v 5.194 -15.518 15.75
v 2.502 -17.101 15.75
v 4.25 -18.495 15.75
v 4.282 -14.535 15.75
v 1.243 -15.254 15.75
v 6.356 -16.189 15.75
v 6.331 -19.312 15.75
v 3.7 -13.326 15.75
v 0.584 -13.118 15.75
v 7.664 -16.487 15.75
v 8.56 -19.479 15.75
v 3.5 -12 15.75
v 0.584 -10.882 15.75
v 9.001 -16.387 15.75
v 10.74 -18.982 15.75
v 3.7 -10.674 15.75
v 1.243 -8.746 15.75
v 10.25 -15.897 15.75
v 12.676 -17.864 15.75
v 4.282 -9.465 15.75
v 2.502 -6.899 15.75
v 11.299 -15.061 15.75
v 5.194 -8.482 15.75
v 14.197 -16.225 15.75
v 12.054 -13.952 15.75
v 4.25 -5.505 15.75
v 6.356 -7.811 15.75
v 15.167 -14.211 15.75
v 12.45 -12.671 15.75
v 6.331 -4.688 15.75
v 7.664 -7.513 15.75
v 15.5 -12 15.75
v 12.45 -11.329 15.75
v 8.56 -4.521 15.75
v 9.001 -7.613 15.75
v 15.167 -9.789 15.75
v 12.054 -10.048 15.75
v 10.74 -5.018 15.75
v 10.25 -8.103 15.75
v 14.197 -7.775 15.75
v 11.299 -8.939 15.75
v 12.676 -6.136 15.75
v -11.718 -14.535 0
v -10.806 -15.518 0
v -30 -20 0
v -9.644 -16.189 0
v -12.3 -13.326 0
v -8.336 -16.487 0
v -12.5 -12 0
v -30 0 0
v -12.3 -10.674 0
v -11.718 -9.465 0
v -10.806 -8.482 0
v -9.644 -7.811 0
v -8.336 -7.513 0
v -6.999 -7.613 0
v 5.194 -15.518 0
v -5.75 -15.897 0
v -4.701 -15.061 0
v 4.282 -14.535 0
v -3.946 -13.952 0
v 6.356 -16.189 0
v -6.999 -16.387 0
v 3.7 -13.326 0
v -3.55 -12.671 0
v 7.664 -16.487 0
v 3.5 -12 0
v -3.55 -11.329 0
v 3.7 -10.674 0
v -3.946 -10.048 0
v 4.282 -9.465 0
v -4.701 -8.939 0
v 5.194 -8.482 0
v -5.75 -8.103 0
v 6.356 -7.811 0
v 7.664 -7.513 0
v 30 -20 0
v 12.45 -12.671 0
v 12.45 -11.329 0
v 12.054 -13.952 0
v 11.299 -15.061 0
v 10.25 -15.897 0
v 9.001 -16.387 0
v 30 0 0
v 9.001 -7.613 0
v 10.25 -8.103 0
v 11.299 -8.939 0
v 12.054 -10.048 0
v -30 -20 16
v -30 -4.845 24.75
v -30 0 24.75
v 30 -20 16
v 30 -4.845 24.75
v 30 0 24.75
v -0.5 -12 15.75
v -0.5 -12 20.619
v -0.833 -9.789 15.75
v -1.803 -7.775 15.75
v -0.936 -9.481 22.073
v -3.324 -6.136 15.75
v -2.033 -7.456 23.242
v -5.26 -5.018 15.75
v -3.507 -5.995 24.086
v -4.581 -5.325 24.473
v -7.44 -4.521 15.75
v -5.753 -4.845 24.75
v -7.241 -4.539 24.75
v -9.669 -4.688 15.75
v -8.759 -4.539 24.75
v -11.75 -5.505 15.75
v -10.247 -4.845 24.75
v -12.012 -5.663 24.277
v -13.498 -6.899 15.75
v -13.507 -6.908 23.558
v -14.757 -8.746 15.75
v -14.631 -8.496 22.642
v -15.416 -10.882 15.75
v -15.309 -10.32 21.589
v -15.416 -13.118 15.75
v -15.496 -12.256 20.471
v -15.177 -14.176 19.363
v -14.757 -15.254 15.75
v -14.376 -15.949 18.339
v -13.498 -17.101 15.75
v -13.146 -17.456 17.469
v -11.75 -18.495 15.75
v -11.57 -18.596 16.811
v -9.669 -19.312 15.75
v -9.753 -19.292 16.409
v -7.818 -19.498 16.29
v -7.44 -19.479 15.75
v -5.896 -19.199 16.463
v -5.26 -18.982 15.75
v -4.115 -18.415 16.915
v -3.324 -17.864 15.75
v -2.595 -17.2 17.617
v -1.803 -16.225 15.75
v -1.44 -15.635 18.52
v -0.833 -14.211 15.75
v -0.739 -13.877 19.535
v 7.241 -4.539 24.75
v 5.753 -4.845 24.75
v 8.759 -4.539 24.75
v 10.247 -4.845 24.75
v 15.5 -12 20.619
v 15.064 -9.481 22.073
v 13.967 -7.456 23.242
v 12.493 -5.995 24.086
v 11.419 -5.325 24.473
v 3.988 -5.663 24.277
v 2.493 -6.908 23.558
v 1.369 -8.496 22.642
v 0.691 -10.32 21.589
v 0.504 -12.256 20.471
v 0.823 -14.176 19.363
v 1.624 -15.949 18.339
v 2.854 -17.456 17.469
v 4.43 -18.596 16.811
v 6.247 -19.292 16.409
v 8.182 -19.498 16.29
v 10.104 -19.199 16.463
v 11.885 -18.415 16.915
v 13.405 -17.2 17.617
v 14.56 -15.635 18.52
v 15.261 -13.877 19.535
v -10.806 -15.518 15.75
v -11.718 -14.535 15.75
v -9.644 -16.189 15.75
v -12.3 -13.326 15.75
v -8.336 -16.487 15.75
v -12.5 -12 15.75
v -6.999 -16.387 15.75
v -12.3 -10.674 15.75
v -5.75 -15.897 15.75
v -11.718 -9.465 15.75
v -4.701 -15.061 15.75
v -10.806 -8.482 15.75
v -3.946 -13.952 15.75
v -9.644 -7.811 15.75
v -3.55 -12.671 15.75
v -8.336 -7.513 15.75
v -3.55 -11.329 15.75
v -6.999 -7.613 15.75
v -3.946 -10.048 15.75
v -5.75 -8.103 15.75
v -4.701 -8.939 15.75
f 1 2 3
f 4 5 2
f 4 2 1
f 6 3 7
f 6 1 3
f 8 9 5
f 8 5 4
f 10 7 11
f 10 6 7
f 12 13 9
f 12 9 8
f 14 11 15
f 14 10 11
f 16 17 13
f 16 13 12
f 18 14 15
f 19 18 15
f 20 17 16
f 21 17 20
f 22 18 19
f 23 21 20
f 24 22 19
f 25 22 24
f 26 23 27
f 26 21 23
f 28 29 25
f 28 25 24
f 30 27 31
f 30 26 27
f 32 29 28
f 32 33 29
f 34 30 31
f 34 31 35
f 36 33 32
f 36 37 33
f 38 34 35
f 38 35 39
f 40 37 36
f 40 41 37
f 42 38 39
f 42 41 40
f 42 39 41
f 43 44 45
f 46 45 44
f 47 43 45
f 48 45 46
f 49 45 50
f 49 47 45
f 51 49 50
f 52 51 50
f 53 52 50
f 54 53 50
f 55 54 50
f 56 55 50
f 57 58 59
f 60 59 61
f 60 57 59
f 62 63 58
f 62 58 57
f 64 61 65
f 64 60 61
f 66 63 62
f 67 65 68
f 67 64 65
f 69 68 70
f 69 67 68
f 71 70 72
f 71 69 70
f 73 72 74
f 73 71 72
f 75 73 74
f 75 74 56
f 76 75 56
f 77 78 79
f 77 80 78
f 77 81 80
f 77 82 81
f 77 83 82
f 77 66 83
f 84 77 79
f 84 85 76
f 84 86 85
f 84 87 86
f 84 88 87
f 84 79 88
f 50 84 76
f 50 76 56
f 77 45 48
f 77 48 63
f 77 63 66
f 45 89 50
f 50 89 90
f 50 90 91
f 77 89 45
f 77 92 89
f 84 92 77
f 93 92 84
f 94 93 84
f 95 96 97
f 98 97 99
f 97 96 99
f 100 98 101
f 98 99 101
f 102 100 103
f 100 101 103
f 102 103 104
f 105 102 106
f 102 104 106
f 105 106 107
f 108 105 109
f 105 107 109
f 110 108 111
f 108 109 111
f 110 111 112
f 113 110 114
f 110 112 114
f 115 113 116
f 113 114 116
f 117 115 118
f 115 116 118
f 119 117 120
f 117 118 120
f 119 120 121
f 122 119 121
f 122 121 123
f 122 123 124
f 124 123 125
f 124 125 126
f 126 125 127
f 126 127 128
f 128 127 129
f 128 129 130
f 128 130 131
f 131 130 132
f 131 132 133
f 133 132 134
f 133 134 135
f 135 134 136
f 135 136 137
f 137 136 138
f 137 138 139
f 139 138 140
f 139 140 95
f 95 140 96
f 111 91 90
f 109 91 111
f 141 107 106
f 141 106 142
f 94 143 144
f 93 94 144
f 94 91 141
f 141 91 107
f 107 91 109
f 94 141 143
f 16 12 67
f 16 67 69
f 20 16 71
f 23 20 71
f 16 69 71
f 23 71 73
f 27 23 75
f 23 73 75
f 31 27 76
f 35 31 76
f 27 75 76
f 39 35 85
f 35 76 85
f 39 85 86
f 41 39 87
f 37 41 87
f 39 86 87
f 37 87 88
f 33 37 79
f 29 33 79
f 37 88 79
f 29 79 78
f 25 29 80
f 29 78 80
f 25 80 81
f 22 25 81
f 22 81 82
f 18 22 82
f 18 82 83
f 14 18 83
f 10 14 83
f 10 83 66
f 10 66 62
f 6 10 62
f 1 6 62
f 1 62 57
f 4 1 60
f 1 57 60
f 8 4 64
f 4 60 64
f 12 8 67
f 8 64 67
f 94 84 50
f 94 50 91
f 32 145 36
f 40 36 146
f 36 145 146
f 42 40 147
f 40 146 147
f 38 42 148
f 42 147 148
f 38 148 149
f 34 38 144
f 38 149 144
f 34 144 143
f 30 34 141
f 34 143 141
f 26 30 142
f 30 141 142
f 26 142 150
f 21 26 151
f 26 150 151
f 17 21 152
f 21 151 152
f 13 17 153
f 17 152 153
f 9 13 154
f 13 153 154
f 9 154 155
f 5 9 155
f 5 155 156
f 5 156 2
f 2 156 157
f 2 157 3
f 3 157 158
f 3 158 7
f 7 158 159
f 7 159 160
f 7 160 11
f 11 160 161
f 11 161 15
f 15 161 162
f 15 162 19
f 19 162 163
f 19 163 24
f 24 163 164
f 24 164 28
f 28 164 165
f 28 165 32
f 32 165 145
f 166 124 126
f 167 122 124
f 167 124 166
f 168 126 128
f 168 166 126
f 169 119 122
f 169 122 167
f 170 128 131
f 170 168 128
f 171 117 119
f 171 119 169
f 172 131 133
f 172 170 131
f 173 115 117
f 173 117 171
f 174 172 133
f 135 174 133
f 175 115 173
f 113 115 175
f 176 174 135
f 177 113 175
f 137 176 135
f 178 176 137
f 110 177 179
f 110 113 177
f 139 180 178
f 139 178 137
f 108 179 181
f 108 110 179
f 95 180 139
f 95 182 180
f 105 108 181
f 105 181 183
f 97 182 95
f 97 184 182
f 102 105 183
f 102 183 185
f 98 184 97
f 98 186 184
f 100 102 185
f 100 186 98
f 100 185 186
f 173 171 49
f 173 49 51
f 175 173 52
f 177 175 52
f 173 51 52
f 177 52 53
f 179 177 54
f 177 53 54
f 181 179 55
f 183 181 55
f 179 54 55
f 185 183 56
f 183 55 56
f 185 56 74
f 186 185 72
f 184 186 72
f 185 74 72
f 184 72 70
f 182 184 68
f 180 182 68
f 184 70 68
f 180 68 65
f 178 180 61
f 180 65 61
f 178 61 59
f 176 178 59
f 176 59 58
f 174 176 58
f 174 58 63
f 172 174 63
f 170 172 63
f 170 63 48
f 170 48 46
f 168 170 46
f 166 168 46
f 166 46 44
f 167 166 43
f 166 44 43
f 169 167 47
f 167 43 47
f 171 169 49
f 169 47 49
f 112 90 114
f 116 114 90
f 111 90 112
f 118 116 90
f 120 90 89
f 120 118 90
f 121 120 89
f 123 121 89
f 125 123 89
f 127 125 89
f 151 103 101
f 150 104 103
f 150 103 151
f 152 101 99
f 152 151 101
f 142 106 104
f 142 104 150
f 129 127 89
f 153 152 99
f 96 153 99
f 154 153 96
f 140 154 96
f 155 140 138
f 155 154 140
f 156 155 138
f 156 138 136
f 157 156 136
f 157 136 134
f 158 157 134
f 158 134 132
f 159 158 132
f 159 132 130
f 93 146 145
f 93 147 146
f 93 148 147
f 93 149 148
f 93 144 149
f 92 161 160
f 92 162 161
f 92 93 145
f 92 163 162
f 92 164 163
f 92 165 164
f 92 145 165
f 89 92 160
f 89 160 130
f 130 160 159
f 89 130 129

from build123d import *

# Parameters (mm, degrees)
F1_DEPTH       = 30
F3_D           = 9
F3_CBORE_D     = 15
F3_CBORE_DEPTH = 9


with BuildPart() as f1:
    # F0 (on Right) → F1 (new body, symmetric)
    with BuildSketch(Plane.YZ):
        Polygon((-20, 0), (0, 0), (0, 24.75), (-4.844555, 24.75), (-20, 16), align=None)
    extrude(amount=F1_DEPTH, both=True)

    # F3 (through all)
    with Locations(Plane.XY.offset(24.75)):
        with Locations((-8, -12), (8, -12)):
            CounterBoreHole(F3_D / 2, F3_CBORE_D / 2, F3_CBORE_DEPTH)


solid = f1.part
